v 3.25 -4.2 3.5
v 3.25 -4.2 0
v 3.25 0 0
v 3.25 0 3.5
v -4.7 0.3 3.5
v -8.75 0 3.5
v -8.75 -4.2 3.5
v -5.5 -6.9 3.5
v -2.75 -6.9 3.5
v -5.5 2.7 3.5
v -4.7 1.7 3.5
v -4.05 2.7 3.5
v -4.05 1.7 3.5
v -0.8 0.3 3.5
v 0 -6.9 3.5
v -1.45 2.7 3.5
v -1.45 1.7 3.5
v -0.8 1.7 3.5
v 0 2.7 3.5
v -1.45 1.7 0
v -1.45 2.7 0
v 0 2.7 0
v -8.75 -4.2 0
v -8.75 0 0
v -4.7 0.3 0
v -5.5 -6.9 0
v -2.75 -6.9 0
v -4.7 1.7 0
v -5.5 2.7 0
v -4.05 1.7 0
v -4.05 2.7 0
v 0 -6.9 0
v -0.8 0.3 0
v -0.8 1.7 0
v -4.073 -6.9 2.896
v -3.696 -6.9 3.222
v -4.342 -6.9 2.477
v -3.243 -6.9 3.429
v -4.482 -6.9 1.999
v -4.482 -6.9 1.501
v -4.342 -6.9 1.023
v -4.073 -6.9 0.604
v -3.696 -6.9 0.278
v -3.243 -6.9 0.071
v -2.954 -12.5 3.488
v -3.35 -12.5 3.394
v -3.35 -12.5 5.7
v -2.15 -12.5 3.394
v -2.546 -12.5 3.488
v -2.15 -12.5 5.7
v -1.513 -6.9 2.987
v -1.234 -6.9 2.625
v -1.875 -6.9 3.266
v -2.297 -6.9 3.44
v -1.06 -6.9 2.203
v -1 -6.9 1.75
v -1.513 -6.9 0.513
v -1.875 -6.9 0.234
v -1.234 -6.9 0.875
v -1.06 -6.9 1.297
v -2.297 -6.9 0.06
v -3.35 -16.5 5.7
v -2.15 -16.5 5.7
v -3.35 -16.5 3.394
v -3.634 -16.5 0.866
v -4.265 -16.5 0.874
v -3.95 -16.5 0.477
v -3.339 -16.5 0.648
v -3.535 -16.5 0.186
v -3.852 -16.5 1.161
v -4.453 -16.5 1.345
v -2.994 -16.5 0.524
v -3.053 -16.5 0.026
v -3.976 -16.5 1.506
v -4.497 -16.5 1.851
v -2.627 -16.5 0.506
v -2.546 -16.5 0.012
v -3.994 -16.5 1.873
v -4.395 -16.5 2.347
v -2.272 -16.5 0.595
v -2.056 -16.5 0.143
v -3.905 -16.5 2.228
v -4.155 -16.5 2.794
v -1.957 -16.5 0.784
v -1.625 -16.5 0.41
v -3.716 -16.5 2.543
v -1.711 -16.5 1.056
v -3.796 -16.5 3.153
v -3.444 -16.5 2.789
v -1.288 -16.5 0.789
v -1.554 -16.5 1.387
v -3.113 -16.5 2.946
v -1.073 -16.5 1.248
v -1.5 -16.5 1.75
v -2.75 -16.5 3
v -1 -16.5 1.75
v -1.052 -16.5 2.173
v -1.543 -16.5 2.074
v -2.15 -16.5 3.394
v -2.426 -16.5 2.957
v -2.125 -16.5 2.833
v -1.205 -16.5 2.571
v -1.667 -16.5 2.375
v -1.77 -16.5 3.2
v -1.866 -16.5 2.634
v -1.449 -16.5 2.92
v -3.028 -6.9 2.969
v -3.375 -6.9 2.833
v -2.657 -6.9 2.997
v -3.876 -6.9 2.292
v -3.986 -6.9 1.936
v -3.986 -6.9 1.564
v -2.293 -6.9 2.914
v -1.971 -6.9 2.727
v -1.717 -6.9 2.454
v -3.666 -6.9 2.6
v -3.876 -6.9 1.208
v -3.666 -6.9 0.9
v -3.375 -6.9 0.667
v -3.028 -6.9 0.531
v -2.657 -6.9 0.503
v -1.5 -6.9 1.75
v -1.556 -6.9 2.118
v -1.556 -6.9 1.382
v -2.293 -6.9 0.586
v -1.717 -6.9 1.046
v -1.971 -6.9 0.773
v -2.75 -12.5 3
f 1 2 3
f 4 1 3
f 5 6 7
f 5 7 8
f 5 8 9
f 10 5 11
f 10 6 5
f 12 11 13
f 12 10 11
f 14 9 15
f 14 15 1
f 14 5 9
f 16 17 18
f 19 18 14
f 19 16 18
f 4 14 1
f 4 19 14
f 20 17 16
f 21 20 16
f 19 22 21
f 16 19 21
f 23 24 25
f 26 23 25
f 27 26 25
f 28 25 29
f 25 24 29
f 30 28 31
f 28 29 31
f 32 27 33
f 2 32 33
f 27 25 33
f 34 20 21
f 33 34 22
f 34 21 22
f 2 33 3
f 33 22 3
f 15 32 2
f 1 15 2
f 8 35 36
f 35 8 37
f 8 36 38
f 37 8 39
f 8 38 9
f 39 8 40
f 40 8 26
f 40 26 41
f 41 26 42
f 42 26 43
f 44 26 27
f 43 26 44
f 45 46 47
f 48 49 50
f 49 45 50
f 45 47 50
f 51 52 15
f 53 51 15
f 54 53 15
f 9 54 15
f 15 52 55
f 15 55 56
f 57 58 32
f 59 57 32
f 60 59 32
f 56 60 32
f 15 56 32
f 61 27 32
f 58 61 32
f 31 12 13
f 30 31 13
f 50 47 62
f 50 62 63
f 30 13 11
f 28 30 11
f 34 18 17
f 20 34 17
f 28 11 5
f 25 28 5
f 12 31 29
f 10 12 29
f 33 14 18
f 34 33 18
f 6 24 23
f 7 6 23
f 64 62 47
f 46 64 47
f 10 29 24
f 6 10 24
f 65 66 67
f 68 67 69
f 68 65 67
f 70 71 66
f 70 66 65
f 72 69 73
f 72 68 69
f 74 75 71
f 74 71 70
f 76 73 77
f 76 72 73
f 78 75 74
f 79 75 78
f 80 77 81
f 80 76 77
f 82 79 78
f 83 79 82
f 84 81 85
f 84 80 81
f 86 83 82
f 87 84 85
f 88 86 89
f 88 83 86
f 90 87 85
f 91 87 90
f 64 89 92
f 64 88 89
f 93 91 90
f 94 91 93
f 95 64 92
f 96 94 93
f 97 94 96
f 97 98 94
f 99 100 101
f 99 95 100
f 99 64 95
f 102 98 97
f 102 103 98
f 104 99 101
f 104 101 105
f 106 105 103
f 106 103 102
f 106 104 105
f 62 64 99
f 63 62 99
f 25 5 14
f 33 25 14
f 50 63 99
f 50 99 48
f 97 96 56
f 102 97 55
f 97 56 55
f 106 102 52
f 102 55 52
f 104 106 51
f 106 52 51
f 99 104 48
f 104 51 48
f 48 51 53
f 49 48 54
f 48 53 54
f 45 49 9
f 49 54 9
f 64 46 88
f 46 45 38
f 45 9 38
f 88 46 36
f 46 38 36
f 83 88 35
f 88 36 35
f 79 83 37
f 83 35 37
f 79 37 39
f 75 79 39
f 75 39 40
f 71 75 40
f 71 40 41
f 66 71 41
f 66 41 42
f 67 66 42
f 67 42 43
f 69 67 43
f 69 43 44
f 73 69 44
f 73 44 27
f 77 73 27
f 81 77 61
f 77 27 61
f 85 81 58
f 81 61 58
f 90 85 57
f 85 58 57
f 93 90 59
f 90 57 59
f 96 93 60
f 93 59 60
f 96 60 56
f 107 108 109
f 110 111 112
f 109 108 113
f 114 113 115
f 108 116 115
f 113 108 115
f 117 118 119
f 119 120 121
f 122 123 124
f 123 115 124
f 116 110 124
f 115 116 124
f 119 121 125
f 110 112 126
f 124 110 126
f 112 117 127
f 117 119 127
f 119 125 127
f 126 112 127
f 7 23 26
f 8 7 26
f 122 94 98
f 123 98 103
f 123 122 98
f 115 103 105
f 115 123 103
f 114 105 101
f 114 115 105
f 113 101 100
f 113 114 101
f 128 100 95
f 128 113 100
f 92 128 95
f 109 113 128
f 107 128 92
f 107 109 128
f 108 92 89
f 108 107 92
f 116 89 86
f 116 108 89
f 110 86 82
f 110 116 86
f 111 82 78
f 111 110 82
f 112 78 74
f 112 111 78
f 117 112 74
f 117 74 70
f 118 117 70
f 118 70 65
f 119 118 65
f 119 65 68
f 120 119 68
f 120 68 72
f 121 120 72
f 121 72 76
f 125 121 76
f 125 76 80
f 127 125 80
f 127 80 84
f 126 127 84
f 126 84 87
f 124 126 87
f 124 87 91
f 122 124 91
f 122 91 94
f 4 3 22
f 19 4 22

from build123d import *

# Parameters (mm, degrees)
F1_DEPTH      = 3.5
F2_R          = 1.75
F2_R_2        = 1.25
F3_DEPTH      = 9.6
F5_DEPTH      = 3.501
F6_W          = 1.2
F6_H          = 4
F7_DEPTH      = 2.2
F7_DEPTH_BACK = 0.5


with BuildPart() as f1:
    # F0 (on Top) → F1 (new body)
    with BuildSketch(Plane.XY):
        Polygon((0, 2.7), (-5.5, 2.7), (-8.75, 0), (-8.75, -4.2), (-5.5, -6.9), (0, -6.9), (3.25, -4.2), (3.25, 0), align=None)
    extrude(amount=F1_DEPTH)

    # F2 (on face) → F3 (join)
    with BuildSketch(Plane.XZ.offset(6.9)):
        with Locations((-2.75, 1.75)):
            Circle(F2_R)
        with Locations((-2.75, 1.75)):
            Circle(F2_R_2, mode=Mode.SUBTRACT)
    extrude(amount=F3_DEPTH)

    # F4 (on face) → F5 (cut, through all)
    with BuildSketch(Plane.XY.offset(3.5)):
        Polygon((-1.45, 2.7), (-4.05, 2.7), (-4.05, 1.7), (-4.7, 1.7), (-4.7, 0.3), (-0.8, 0.3), (-0.8, 1.7), (-1.45, 1.7), align=None)
    extrude(amount=-F5_DEPTH, mode=Mode.SUBTRACT)

    # F6 (on face) → F7 (join, two sides)
    with BuildSketch(Plane.XY.offset(3.5)) as f7_sk:
        with Locations((-2.75, -14.5)):
            Rectangle(F6_W, F6_H)
    extrude(amount=F7_DEPTH)
    extrude(f7_sk.sketch, amount=-F7_DEPTH_BACK)


solid = f1.part
